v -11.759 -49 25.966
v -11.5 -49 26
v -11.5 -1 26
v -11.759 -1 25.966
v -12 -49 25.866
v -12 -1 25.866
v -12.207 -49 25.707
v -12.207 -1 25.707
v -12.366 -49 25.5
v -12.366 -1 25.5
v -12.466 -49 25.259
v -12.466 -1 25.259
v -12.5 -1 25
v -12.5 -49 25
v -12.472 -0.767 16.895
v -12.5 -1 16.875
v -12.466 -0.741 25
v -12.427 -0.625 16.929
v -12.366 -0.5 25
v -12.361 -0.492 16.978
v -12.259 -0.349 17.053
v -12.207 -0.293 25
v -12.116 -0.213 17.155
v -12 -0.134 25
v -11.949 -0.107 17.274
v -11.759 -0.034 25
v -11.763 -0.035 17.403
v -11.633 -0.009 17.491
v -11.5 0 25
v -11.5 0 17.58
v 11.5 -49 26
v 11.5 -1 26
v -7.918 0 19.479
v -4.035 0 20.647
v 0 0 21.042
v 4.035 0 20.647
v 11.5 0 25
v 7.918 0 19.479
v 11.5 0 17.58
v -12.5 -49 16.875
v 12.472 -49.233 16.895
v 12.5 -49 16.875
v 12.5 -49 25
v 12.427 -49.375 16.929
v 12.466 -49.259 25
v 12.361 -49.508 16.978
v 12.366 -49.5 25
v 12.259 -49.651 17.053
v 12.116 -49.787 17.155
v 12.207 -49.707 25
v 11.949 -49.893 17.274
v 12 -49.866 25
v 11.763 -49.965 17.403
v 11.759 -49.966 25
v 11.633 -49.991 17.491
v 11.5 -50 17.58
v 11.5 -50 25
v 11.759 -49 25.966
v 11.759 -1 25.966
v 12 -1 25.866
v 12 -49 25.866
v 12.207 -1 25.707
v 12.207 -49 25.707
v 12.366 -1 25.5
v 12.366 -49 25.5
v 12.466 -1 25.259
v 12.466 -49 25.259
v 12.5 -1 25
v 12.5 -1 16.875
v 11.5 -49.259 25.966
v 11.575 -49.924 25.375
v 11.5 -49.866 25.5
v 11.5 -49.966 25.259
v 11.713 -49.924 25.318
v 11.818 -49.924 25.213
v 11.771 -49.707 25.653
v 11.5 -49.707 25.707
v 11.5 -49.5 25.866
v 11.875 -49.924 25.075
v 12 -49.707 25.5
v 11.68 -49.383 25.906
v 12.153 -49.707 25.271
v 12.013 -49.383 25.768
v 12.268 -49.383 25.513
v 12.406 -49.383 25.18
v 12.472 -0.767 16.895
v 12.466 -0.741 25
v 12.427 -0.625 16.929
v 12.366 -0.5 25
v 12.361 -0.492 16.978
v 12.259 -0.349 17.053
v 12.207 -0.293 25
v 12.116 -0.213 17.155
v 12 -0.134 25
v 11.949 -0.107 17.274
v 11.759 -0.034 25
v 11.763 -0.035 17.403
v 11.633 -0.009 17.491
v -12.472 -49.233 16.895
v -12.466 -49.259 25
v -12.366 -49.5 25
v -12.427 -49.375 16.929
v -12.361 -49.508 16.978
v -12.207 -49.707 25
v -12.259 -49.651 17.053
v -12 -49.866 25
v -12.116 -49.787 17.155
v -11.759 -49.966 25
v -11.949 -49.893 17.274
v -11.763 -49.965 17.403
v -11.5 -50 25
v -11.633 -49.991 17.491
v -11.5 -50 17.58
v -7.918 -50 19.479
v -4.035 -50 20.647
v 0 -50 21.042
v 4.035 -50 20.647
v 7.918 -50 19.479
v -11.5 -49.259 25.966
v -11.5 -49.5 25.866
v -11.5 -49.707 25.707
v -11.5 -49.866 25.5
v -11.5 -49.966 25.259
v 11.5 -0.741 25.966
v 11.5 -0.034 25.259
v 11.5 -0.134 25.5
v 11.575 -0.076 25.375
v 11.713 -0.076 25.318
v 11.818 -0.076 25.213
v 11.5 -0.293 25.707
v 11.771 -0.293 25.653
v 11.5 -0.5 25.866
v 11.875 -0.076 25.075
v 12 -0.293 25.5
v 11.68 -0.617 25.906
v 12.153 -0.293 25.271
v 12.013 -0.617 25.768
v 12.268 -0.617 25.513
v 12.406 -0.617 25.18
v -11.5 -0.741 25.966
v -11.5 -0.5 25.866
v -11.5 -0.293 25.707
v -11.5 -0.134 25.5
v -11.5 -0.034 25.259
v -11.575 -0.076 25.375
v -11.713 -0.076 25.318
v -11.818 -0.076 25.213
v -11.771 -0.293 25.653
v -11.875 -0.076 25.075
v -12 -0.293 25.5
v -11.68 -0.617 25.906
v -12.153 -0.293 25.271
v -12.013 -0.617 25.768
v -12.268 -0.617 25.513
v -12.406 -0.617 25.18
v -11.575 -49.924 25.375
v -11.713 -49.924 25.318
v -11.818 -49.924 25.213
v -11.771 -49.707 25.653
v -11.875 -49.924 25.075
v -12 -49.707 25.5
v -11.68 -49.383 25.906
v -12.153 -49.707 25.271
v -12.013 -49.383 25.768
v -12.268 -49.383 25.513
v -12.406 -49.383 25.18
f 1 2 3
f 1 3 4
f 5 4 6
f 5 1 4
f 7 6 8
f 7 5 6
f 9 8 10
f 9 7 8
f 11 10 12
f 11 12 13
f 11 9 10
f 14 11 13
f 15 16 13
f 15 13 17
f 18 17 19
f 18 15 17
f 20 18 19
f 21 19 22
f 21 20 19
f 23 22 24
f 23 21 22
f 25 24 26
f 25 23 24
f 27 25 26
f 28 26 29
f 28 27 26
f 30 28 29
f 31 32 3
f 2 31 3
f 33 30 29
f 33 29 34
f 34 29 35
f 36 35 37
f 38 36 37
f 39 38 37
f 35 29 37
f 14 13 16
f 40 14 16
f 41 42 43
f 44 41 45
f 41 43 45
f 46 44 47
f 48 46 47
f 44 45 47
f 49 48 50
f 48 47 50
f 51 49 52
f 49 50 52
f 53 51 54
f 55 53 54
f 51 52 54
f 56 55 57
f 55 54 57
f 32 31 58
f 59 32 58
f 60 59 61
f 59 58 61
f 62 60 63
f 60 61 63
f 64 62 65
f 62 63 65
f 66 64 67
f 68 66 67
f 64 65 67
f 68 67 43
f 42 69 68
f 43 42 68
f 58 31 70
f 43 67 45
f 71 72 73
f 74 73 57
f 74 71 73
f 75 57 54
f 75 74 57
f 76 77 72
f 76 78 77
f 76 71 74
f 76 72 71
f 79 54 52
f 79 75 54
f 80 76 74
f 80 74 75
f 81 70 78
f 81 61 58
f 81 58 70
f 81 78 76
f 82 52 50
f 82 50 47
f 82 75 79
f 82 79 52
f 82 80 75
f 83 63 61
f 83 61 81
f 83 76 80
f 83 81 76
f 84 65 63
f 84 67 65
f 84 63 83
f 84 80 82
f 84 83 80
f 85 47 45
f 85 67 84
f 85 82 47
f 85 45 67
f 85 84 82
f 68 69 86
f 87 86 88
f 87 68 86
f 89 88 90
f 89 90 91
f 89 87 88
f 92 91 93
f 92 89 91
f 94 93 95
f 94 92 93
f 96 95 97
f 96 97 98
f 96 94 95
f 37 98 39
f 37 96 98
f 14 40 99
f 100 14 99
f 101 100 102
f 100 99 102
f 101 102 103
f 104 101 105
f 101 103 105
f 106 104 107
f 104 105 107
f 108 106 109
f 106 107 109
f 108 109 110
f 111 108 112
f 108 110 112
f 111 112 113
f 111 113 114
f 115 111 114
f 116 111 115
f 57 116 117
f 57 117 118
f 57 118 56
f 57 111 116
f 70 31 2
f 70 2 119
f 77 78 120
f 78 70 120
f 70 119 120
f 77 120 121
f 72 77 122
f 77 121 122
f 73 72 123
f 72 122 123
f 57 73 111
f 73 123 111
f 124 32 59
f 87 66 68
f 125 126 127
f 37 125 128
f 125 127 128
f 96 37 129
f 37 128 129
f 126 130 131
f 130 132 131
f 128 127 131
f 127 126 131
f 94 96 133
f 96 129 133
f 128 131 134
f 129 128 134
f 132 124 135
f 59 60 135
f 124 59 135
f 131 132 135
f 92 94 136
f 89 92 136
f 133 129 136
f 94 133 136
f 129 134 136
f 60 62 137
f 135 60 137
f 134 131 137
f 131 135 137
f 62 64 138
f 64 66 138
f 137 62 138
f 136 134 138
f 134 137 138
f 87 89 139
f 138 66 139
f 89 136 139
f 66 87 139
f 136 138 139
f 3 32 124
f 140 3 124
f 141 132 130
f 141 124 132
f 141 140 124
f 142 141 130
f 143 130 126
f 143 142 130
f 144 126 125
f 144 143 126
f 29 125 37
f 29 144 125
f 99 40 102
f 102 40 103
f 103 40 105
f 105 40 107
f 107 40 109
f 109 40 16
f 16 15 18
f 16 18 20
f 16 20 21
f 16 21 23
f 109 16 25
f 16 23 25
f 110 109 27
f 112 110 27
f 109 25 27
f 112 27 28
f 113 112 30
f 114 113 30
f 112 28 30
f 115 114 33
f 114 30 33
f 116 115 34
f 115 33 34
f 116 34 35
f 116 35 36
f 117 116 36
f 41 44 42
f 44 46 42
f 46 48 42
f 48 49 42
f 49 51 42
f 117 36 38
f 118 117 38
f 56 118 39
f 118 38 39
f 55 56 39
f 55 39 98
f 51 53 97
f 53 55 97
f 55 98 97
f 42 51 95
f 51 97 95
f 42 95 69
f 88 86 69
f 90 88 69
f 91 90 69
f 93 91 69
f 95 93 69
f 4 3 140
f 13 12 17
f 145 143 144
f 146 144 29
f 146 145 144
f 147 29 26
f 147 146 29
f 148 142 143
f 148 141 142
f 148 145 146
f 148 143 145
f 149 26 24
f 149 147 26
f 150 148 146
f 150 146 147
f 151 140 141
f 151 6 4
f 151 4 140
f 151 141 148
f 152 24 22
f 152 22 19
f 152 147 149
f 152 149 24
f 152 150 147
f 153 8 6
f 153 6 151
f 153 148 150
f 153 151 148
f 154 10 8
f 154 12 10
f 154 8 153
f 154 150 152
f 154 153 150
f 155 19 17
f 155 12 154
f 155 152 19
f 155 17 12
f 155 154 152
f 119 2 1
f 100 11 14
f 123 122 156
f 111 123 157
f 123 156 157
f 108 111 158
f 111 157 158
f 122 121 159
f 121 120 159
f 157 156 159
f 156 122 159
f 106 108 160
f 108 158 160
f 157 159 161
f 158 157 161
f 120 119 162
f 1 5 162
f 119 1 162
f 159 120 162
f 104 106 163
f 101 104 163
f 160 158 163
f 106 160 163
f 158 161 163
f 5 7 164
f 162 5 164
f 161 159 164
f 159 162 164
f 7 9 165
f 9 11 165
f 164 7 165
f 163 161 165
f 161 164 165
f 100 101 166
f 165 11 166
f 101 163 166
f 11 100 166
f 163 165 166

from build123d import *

# Parameters (mm, degrees)
F1_DEPTH = 50
F2_R     = 1


with BuildPart() as f1:
    # F0 (on Front) → F1 (new body)
    with BuildSketch(Plane.XZ):
        with BuildLine():
            Line((12.5, 26), (-12.5, 26))
            Line((-12.5, 26), (-12.5, 16.874537))
            ThreePointArc((-12.5, 16.874537), (0, 21.04193), (12.5, 16.874537))
            Line((12.5, 16.874537), (12.5, 26))
        make_face()
    extrude(amount=F1_DEPTH)

    # F2
    f2_edges = [f1.edges().sort_by_distance(p)[0] for p in [
        (12.5, -25, 26),
        (-12.5, -25, 26),
        (0, 0, 26),
        (0, -50, 26),
        (12.5, -50, 21.437269),
        (-12.5, -50, 21.437269),
        (-12.5, 0, 21.437269),
        (12.5, 0, 21.437269),
    ]]
    fillet(f2_edges, radius=F2_R)


solid = f1.part
